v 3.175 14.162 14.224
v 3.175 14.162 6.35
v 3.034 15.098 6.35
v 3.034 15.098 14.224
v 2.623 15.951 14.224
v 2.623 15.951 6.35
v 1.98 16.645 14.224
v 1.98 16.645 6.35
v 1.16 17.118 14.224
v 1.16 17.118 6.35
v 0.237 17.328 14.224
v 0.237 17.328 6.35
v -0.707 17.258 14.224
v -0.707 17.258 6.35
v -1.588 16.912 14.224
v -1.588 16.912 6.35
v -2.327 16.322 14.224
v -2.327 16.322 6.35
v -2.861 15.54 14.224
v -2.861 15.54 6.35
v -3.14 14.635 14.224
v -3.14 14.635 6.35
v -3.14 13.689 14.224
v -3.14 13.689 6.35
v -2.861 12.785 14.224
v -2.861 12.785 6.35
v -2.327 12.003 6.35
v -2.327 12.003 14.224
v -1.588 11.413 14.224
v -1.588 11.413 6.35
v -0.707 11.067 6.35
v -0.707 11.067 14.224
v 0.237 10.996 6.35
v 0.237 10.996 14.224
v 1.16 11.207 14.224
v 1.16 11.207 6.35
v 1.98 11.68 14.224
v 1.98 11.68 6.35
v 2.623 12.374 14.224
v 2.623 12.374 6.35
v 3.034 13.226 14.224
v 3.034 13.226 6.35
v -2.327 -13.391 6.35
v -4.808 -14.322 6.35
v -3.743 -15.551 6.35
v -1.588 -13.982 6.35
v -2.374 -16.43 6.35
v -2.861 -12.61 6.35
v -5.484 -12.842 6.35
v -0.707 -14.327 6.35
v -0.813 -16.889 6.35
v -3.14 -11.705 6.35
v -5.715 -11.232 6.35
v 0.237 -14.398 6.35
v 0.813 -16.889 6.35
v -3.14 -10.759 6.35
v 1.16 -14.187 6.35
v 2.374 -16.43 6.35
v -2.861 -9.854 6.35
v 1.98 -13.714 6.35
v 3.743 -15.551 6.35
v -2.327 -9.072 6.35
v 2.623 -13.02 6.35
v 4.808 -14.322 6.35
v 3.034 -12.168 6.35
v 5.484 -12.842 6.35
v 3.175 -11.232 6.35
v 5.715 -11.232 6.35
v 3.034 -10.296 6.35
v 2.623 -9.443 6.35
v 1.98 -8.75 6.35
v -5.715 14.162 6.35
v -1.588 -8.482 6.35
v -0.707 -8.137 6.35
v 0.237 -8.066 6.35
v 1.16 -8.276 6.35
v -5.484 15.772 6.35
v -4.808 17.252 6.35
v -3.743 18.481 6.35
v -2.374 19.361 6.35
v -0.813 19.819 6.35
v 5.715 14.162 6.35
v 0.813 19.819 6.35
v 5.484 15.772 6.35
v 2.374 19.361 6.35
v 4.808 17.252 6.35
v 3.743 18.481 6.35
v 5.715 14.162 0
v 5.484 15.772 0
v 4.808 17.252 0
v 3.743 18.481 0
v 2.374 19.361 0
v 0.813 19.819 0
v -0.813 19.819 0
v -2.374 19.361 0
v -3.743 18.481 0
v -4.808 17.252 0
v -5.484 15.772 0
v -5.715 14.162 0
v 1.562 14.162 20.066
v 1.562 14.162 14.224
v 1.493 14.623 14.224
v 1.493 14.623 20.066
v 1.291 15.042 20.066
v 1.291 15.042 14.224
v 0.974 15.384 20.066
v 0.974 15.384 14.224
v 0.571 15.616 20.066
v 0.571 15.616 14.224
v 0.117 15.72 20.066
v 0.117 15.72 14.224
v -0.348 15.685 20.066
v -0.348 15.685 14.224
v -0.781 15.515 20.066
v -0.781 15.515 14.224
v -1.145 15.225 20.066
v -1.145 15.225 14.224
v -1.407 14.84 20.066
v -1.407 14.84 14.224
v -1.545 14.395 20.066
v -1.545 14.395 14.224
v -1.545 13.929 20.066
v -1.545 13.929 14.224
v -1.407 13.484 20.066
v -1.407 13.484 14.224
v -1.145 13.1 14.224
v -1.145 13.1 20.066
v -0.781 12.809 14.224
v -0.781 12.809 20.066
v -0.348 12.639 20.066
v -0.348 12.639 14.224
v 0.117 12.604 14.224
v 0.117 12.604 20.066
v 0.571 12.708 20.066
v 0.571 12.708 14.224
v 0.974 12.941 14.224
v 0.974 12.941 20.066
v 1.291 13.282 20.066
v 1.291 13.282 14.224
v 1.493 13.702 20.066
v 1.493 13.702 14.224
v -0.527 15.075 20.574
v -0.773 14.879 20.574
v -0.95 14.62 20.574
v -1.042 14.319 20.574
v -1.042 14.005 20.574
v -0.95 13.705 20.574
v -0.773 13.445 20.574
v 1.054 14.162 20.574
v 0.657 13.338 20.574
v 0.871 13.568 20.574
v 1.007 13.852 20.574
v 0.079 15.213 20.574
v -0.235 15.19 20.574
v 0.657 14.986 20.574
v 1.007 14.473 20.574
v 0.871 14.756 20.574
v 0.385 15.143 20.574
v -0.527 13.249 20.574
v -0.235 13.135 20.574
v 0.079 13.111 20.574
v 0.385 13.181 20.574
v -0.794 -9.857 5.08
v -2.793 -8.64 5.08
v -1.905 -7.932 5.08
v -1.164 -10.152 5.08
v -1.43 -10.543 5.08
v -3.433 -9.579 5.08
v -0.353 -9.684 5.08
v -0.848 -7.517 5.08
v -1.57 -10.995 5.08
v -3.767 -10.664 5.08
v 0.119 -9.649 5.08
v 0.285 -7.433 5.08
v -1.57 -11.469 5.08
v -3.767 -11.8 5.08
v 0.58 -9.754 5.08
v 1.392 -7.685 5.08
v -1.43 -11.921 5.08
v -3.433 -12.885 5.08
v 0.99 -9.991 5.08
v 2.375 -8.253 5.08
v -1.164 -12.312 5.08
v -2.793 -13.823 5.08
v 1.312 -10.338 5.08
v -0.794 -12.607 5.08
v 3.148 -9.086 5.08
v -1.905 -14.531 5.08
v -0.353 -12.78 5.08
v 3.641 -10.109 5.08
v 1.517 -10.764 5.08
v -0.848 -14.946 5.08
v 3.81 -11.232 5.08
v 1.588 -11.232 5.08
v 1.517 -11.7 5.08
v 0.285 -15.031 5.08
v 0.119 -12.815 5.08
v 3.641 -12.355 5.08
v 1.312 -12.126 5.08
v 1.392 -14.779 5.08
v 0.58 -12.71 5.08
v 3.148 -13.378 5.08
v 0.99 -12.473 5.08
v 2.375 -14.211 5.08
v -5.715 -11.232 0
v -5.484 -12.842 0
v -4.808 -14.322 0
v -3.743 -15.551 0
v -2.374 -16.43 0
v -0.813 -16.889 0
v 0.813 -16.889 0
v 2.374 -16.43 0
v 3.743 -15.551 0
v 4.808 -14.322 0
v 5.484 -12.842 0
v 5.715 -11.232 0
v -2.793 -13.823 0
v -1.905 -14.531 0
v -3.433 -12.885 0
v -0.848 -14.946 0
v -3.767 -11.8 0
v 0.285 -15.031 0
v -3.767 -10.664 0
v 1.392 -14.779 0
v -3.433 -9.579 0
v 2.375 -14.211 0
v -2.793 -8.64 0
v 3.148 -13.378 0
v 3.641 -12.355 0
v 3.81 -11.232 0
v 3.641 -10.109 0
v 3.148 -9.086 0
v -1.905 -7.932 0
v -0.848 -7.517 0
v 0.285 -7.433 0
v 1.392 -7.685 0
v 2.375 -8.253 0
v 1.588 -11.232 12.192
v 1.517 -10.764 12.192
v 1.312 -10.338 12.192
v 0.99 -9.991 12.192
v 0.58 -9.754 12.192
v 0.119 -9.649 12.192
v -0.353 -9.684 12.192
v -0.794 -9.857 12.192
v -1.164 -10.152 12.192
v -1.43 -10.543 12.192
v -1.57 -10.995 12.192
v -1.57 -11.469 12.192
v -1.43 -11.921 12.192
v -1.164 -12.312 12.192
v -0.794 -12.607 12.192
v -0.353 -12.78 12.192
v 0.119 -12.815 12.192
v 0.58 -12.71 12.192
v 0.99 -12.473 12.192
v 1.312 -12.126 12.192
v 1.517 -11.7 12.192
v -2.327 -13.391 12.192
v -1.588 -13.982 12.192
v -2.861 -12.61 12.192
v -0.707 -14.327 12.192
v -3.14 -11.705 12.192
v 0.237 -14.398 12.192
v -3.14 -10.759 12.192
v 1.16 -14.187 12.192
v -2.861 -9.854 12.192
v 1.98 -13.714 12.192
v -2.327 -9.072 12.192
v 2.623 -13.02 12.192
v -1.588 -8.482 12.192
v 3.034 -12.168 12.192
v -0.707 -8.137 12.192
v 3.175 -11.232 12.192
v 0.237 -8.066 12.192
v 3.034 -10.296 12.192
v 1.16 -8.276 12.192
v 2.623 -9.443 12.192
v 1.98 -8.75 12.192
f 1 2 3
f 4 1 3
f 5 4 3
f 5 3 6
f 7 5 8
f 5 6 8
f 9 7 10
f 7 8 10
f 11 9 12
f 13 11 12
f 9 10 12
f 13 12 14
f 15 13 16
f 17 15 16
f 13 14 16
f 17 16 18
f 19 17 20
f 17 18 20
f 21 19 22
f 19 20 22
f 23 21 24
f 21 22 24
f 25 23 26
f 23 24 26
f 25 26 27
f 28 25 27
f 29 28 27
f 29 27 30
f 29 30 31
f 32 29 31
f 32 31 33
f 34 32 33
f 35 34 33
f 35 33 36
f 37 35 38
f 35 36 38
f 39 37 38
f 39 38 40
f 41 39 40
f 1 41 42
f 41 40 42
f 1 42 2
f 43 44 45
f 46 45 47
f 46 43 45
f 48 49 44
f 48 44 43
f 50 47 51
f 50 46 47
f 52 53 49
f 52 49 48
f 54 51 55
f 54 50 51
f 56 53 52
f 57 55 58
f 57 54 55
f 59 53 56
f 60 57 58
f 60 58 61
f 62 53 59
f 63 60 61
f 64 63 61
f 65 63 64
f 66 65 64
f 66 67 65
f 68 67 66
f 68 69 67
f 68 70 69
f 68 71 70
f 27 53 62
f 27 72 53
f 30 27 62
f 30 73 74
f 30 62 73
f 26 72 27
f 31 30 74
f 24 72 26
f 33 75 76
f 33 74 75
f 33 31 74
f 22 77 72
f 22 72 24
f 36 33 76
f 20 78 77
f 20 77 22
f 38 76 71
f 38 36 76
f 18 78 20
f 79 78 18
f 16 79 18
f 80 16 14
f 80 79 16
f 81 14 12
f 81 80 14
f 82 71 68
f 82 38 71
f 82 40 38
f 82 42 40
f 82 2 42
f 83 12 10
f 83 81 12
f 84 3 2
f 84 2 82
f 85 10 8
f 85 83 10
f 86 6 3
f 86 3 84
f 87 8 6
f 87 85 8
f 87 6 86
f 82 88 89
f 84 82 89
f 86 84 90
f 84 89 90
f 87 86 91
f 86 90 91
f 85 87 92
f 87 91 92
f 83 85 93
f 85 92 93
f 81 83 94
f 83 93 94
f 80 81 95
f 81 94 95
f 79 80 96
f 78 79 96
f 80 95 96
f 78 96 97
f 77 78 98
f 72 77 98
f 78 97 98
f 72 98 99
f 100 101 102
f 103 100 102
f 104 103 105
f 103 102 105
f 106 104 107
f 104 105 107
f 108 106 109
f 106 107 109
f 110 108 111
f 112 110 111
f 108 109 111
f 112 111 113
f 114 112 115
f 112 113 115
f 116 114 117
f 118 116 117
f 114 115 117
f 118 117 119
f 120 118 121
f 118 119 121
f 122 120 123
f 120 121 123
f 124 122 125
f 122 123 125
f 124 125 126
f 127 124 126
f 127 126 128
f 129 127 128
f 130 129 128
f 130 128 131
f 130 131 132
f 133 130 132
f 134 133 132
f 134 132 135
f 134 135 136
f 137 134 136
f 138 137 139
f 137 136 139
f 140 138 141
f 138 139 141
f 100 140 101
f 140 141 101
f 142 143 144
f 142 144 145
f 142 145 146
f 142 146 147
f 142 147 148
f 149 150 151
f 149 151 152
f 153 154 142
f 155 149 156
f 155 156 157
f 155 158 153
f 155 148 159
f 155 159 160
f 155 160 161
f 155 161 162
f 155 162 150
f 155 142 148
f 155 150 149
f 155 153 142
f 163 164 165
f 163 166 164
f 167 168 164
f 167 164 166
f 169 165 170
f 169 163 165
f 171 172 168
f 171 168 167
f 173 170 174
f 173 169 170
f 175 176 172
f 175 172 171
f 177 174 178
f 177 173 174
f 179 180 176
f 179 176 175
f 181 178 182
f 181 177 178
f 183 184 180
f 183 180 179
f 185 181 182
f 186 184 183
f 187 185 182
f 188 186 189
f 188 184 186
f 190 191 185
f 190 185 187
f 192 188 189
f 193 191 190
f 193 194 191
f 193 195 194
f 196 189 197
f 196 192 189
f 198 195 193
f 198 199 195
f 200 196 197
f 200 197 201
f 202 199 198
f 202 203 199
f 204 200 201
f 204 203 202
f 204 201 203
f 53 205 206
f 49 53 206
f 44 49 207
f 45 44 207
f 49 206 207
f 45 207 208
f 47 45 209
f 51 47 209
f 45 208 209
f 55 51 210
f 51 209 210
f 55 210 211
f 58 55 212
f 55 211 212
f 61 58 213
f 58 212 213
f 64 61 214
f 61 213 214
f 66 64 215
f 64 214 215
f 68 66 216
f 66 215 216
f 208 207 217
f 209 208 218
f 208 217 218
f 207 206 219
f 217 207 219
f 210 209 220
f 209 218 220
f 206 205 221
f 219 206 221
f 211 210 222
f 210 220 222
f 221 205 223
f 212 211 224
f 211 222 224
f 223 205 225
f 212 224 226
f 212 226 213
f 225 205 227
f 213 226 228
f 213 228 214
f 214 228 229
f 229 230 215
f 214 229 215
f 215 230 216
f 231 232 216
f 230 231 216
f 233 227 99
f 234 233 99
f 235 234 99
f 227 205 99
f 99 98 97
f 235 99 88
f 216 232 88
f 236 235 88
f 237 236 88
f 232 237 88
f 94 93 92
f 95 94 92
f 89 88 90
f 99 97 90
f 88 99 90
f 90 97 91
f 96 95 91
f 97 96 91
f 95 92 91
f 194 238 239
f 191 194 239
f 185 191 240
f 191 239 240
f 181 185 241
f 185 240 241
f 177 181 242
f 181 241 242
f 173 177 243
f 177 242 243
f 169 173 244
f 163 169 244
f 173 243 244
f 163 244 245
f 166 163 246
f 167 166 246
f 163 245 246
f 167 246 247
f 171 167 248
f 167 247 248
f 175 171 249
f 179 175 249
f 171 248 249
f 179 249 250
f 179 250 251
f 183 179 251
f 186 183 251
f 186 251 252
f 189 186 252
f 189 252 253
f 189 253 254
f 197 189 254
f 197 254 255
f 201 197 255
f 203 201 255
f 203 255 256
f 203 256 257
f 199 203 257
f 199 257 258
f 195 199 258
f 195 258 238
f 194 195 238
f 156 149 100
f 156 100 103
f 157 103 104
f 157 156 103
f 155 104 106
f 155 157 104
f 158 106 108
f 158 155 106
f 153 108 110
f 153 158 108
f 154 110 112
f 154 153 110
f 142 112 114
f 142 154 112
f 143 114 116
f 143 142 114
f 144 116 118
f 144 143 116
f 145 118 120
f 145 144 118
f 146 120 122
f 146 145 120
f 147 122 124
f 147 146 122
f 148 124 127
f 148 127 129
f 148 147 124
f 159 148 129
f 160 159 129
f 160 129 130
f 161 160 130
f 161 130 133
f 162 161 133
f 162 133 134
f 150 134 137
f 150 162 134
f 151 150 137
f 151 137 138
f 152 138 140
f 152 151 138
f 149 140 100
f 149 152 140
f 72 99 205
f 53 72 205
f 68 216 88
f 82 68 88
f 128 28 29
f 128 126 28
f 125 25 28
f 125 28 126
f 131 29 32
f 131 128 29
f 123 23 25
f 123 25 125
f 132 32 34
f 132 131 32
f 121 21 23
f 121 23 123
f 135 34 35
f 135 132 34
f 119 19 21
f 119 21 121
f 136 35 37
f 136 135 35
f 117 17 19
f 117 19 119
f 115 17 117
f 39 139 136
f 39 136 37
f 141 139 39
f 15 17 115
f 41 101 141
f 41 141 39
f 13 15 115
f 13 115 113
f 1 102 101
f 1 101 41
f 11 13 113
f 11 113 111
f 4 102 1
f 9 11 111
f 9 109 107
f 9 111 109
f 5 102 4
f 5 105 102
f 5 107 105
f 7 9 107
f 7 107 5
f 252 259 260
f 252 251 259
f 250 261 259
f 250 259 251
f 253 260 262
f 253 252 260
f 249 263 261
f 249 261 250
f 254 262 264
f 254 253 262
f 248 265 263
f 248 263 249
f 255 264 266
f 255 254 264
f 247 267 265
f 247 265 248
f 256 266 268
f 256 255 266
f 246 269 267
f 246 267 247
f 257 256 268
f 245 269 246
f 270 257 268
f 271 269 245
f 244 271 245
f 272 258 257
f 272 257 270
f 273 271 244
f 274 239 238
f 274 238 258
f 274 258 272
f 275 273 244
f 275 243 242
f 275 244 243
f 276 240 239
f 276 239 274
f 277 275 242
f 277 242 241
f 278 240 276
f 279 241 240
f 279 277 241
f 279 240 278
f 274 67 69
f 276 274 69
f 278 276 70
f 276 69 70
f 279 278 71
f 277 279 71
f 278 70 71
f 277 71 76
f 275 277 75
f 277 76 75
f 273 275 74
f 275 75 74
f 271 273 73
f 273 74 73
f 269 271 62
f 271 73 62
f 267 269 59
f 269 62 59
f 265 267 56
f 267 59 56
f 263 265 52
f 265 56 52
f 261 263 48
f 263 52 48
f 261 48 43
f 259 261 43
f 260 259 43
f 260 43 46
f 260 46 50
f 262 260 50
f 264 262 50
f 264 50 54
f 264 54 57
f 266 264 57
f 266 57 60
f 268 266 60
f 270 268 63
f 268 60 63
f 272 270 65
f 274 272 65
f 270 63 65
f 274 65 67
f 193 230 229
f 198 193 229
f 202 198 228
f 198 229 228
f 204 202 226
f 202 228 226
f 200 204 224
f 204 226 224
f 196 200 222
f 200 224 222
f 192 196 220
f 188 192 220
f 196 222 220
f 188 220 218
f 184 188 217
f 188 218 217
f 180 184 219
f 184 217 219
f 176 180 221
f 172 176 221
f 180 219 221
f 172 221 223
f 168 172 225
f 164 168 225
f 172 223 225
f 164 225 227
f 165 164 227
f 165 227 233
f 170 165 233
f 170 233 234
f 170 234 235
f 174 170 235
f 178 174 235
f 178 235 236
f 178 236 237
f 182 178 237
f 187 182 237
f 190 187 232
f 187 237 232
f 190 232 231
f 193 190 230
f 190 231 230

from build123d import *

# Parameters (mm, degrees)
F1_DEPTH  = 6.35
F2_R      = 3.175
F3_DEPTH  = 7.874
F4_R      = 1.5621
F5_DEPTH  = 6.35
F6_SIZE   = 0.508
F7_R      = 3.175
F8_DEPTH  = 5.842
F9_R      = 1.5875
F10_DEPTH = 12.193
F11_R     = 3.81
F12_DEPTH = 5.08


with BuildPart() as f1:
    # F0 (on Top) → F1 (new body)
    with BuildSketch(Plane.XY):
        with BuildLine():
            ThreePointArc((5.715, 14.162212), (0, 19.877212), (-5.715, 14.162212))
            Line((-5.715, 14.162212), (-5.715, -11.231923))
            ThreePointArc((-5.715, -11.231923), (0, -16.946923), (5.715, -11.231923))
            Line((5.715, -11.231923), (5.715, 14.162212))
        make_face()
    extrude(amount=F1_DEPTH)

    # F2 (on face) → F3 (join)
    with BuildSketch(Plane.XY.offset(6.35)):
        with Locations((0, 14.162212)):
            Circle(F2_R)
    extrude(amount=F3_DEPTH)

    # F4 (on face) → F5 (join)
    with BuildSketch(Plane.XY.offset(14.224)):
        with Locations((0, 14.162212)):
            Circle(F4_R)
    extrude(amount=F5_DEPTH)

    # F6
    f6_edges = [f1.edges().sort_by_distance(p)[0] for p in [
        (-1.5621, 14.162212, 20.574),
    ]]
    chamfer(f6_edges, length=F6_SIZE)

    # F7 (on face) → F8 (join)
    with BuildSketch(Plane.XY.offset(6.35)):
        with Locations((0, -11.231923)):
            Circle(F7_R)
    extrude(amount=F8_DEPTH)

    # F9 (on face) → F10 (cut, through all)
    with BuildSketch(Plane.XY.offset(12.192)):
        with Locations((0, -11.231923)):
            Circle(F9_R)
    extrude(amount=-F10_DEPTH, mode=Mode.SUBTRACT)

    # F11 (on face) → F12 (cut)
    with BuildSketch(Plane(origin=(0, 0, 0), x_dir=(1, 0, 0), z_dir=(0, 0, -1))):
        with Locations((0, 11.231923)):
            Circle(F11_R)
    extrude(amount=-F12_DEPTH, mode=Mode.SUBTRACT)


solid = f1.part
